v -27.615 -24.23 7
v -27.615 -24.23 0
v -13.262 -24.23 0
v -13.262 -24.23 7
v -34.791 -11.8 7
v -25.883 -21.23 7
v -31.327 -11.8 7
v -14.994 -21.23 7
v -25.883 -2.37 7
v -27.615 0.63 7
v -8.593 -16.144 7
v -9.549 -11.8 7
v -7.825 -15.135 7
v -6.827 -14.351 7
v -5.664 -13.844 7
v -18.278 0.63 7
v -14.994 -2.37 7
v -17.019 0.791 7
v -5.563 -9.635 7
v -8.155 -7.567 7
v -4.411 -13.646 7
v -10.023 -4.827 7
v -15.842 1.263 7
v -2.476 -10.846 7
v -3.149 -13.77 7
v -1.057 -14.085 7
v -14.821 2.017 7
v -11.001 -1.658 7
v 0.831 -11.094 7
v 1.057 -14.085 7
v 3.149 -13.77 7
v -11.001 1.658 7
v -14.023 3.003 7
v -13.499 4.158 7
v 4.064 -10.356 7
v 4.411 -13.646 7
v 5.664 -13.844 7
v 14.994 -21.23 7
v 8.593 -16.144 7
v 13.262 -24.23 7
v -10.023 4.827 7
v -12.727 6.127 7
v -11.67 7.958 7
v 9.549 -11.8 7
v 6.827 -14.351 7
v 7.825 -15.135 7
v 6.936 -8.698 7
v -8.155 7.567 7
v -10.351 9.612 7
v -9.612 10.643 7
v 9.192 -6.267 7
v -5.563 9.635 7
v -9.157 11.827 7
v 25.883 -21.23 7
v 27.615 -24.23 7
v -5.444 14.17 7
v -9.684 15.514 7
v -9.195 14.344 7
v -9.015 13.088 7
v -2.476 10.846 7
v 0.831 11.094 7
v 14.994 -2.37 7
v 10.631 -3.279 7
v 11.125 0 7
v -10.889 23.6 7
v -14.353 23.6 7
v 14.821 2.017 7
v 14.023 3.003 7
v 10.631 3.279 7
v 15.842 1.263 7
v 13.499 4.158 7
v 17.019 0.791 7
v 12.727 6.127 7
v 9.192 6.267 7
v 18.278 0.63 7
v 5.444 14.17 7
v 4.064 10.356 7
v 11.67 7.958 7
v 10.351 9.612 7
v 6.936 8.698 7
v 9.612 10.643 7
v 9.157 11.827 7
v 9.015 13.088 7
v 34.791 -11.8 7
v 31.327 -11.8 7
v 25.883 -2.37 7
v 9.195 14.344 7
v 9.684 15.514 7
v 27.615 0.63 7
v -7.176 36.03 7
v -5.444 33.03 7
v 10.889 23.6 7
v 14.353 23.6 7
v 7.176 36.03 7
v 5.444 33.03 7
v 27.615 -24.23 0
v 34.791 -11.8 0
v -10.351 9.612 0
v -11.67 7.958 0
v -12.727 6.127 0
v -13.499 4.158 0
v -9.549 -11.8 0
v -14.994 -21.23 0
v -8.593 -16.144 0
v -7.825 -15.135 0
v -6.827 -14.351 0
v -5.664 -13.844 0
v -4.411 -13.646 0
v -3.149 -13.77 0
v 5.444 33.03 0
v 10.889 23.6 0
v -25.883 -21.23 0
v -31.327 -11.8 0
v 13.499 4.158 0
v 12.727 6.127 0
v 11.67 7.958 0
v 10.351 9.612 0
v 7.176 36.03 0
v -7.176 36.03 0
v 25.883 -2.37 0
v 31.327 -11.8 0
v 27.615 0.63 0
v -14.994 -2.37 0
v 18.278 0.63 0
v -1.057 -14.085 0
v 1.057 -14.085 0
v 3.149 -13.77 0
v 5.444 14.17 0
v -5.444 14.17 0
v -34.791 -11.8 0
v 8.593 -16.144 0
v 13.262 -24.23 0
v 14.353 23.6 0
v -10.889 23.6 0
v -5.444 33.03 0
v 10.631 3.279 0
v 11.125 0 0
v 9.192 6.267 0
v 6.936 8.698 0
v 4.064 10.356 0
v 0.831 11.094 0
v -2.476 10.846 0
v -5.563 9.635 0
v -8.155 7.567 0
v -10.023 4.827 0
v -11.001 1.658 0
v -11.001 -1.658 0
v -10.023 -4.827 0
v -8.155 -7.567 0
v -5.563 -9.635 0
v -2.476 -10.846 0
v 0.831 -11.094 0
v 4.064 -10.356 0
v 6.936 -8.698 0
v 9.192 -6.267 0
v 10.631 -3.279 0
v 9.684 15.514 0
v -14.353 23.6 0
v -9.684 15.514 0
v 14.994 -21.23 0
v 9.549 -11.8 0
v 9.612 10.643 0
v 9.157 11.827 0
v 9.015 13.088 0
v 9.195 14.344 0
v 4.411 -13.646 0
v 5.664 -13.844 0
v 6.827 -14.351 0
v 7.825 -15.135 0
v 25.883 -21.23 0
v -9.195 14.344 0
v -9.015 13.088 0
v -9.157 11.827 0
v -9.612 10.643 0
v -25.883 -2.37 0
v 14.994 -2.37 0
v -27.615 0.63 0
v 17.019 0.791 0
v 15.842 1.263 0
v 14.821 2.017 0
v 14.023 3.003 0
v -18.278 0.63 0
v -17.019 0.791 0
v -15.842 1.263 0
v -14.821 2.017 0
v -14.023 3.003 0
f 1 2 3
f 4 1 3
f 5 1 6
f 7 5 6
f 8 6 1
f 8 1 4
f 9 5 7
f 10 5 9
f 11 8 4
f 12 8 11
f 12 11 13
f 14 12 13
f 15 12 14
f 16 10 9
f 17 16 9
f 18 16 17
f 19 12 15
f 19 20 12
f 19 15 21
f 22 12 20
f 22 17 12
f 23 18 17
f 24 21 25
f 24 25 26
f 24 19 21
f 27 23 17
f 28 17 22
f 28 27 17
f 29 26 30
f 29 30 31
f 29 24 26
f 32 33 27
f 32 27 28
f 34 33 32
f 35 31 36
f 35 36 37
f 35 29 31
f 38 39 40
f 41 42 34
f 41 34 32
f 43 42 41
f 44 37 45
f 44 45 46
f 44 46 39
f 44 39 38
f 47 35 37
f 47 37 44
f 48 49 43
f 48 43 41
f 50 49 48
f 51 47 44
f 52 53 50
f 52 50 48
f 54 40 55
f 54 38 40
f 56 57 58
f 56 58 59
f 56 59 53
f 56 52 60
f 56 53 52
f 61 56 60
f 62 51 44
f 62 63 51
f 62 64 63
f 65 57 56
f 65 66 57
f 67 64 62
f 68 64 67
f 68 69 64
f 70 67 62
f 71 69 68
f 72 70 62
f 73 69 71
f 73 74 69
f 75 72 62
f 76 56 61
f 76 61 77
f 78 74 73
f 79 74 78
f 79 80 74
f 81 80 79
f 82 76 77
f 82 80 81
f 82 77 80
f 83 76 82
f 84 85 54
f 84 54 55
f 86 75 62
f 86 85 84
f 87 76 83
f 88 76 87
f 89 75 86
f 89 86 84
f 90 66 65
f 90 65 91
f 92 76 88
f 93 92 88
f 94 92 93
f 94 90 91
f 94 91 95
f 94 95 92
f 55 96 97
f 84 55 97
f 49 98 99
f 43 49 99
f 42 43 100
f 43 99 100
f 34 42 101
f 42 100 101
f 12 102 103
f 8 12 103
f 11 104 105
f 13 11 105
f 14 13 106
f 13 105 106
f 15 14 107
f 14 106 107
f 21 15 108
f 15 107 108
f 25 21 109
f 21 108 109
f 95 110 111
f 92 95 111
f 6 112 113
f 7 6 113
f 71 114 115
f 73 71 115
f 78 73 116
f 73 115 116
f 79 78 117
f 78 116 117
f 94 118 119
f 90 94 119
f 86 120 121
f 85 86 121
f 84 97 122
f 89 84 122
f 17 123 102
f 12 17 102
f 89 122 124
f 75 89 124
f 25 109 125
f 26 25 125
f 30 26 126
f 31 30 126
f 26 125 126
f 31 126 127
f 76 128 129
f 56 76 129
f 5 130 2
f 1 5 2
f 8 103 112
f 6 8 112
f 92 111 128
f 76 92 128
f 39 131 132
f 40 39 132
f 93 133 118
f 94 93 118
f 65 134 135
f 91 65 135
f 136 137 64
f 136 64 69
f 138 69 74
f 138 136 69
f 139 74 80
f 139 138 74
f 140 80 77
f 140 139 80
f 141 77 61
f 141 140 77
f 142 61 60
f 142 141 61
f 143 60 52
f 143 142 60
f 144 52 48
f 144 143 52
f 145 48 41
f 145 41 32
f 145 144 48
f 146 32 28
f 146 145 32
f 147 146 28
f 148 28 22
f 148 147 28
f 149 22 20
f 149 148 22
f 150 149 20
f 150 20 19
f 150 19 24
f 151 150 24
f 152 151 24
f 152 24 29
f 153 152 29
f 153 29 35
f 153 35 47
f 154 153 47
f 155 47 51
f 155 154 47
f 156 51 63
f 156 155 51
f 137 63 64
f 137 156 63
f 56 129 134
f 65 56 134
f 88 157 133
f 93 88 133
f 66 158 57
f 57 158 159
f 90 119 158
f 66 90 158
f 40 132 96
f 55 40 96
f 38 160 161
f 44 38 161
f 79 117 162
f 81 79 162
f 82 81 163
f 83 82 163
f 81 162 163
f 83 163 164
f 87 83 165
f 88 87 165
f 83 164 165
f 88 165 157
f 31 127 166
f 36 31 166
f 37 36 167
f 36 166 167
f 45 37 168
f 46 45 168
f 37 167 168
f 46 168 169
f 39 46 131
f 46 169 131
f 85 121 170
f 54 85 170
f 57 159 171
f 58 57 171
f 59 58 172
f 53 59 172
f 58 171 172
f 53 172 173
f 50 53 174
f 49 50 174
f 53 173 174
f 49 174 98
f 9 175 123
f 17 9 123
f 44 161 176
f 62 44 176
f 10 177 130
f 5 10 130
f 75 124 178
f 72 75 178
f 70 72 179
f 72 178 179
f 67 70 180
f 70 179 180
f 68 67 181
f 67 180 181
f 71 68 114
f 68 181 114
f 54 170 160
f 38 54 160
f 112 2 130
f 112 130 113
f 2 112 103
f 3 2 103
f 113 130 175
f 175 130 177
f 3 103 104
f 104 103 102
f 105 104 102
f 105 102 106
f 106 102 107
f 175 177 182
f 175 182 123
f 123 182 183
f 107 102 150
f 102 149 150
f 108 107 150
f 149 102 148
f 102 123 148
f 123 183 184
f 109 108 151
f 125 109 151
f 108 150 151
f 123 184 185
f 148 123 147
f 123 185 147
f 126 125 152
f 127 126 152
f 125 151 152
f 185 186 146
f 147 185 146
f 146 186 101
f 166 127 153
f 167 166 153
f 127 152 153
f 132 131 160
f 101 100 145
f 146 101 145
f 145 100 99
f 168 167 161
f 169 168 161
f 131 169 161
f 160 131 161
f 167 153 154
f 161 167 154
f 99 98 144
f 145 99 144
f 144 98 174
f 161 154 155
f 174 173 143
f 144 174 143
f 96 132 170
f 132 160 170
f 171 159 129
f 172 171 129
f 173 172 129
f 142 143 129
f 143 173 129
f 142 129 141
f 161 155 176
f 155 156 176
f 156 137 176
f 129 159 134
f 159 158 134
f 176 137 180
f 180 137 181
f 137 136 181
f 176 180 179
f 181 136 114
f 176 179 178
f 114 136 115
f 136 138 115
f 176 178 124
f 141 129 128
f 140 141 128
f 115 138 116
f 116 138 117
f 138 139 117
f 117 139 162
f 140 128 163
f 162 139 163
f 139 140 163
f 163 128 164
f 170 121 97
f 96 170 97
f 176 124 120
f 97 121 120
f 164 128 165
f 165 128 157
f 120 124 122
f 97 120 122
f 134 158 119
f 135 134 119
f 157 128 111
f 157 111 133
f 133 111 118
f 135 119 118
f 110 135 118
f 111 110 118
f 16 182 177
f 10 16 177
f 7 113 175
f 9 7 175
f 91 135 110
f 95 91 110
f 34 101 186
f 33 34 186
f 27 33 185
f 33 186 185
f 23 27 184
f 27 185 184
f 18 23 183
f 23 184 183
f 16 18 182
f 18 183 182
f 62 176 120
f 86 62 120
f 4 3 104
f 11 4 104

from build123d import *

# Parameters (mm, degrees)
F0_R     = 11.125
F1_DEPTH = 7


with BuildPart() as f1:
    # F0 (on Top) → F1 (new body)
    with BuildSketch(Plane.XY):
        with BuildLine():
            Line((7.176464, 36.03), (-7.176464, 36.03))
            Line((-7.176464, 36.03), (-14.352928, 23.6))
            Line((-14.352928, 23.6), (-9.68437, 15.51382))
            ThreePointArc((-9.68437, 15.51382), (-9.046046, 12.45302), (-10.350576, 9.611514))
            ThreePointArc((-10.350576, 9.611514), (-12.232609, 7.0625), (-13.499103, 4.158105))
            ThreePointArc((-13.499103, 4.158105), (-15.307655, 1.607595), (-18.277547, 0.63))
            Line((-18.277547, 0.63), (-27.614663, 0.63))
            Line((-27.614663, 0.63), (-34.791127, -11.8))
            Line((-34.791127, -11.8), (-27.614663, -24.23))
            Line((-27.614663, -24.23), (-13.261736, -24.23))
            Line((-13.261736, -24.23), (-8.593178, -16.14382))
            ThreePointArc((-8.593178, -16.14382), (-6.261609, -14.060615), (-3.148527, -13.769619))
            ThreePointArc((-3.148527, -13.769619), (0, -14.125), (3.148527, -13.769619))
            ThreePointArc((3.148527, -13.769619), (6.261609, -14.060615), (8.593178, -16.14382))
            Line((8.593178, -16.14382), (13.261736, -24.23))
            Line((13.261736, -24.23), (27.614663, -24.23))
            Line((27.614663, -24.23), (34.791127, -11.8))
            Line((34.791127, -11.8), (27.614663, 0.63))
            Line((27.614663, 0.63), (18.277547, 0.63))
            ThreePointArc((18.277547, 0.63), (15.307655, 1.607595), (13.499103, 4.158105))
            ThreePointArc((13.499103, 4.158105), (12.232609, 7.0625), (10.350576, 9.611514))
            ThreePointArc((10.350576, 9.611514), (9.046046, 12.45302), (9.68437, 15.51382))
            Line((9.68437, 15.51382), (14.352928, 23.6))
            Line((14.352928, 23.6), (7.176464, 36.03))
        make_face()
        Polygon((-31.327026, -11.8), (-25.882613, -2.37), (-14.993786, -2.37), (-9.549373, -11.8), (-14.993786, -21.23), (-25.882613, -21.23), align=None, mode=Mode.SUBTRACT)
        Polygon((25.882613, -21.23), (14.993786, -21.23), (9.549373, -11.8), (14.993786, -2.37), (25.882613, -2.37), (31.327026, -11.8), align=None, mode=Mode.SUBTRACT)
        Circle(F0_R, mode=Mode.SUBTRACT)
        Polygon((-10.888826, 23.6), (-5.444413, 33.03), (5.444413, 33.03), (10.888826, 23.6), (5.444413, 14.17), (-5.444413, 14.17), align=None, mode=Mode.SUBTRACT)
    extrude(amount=F1_DEPTH)


solid = f1.part
